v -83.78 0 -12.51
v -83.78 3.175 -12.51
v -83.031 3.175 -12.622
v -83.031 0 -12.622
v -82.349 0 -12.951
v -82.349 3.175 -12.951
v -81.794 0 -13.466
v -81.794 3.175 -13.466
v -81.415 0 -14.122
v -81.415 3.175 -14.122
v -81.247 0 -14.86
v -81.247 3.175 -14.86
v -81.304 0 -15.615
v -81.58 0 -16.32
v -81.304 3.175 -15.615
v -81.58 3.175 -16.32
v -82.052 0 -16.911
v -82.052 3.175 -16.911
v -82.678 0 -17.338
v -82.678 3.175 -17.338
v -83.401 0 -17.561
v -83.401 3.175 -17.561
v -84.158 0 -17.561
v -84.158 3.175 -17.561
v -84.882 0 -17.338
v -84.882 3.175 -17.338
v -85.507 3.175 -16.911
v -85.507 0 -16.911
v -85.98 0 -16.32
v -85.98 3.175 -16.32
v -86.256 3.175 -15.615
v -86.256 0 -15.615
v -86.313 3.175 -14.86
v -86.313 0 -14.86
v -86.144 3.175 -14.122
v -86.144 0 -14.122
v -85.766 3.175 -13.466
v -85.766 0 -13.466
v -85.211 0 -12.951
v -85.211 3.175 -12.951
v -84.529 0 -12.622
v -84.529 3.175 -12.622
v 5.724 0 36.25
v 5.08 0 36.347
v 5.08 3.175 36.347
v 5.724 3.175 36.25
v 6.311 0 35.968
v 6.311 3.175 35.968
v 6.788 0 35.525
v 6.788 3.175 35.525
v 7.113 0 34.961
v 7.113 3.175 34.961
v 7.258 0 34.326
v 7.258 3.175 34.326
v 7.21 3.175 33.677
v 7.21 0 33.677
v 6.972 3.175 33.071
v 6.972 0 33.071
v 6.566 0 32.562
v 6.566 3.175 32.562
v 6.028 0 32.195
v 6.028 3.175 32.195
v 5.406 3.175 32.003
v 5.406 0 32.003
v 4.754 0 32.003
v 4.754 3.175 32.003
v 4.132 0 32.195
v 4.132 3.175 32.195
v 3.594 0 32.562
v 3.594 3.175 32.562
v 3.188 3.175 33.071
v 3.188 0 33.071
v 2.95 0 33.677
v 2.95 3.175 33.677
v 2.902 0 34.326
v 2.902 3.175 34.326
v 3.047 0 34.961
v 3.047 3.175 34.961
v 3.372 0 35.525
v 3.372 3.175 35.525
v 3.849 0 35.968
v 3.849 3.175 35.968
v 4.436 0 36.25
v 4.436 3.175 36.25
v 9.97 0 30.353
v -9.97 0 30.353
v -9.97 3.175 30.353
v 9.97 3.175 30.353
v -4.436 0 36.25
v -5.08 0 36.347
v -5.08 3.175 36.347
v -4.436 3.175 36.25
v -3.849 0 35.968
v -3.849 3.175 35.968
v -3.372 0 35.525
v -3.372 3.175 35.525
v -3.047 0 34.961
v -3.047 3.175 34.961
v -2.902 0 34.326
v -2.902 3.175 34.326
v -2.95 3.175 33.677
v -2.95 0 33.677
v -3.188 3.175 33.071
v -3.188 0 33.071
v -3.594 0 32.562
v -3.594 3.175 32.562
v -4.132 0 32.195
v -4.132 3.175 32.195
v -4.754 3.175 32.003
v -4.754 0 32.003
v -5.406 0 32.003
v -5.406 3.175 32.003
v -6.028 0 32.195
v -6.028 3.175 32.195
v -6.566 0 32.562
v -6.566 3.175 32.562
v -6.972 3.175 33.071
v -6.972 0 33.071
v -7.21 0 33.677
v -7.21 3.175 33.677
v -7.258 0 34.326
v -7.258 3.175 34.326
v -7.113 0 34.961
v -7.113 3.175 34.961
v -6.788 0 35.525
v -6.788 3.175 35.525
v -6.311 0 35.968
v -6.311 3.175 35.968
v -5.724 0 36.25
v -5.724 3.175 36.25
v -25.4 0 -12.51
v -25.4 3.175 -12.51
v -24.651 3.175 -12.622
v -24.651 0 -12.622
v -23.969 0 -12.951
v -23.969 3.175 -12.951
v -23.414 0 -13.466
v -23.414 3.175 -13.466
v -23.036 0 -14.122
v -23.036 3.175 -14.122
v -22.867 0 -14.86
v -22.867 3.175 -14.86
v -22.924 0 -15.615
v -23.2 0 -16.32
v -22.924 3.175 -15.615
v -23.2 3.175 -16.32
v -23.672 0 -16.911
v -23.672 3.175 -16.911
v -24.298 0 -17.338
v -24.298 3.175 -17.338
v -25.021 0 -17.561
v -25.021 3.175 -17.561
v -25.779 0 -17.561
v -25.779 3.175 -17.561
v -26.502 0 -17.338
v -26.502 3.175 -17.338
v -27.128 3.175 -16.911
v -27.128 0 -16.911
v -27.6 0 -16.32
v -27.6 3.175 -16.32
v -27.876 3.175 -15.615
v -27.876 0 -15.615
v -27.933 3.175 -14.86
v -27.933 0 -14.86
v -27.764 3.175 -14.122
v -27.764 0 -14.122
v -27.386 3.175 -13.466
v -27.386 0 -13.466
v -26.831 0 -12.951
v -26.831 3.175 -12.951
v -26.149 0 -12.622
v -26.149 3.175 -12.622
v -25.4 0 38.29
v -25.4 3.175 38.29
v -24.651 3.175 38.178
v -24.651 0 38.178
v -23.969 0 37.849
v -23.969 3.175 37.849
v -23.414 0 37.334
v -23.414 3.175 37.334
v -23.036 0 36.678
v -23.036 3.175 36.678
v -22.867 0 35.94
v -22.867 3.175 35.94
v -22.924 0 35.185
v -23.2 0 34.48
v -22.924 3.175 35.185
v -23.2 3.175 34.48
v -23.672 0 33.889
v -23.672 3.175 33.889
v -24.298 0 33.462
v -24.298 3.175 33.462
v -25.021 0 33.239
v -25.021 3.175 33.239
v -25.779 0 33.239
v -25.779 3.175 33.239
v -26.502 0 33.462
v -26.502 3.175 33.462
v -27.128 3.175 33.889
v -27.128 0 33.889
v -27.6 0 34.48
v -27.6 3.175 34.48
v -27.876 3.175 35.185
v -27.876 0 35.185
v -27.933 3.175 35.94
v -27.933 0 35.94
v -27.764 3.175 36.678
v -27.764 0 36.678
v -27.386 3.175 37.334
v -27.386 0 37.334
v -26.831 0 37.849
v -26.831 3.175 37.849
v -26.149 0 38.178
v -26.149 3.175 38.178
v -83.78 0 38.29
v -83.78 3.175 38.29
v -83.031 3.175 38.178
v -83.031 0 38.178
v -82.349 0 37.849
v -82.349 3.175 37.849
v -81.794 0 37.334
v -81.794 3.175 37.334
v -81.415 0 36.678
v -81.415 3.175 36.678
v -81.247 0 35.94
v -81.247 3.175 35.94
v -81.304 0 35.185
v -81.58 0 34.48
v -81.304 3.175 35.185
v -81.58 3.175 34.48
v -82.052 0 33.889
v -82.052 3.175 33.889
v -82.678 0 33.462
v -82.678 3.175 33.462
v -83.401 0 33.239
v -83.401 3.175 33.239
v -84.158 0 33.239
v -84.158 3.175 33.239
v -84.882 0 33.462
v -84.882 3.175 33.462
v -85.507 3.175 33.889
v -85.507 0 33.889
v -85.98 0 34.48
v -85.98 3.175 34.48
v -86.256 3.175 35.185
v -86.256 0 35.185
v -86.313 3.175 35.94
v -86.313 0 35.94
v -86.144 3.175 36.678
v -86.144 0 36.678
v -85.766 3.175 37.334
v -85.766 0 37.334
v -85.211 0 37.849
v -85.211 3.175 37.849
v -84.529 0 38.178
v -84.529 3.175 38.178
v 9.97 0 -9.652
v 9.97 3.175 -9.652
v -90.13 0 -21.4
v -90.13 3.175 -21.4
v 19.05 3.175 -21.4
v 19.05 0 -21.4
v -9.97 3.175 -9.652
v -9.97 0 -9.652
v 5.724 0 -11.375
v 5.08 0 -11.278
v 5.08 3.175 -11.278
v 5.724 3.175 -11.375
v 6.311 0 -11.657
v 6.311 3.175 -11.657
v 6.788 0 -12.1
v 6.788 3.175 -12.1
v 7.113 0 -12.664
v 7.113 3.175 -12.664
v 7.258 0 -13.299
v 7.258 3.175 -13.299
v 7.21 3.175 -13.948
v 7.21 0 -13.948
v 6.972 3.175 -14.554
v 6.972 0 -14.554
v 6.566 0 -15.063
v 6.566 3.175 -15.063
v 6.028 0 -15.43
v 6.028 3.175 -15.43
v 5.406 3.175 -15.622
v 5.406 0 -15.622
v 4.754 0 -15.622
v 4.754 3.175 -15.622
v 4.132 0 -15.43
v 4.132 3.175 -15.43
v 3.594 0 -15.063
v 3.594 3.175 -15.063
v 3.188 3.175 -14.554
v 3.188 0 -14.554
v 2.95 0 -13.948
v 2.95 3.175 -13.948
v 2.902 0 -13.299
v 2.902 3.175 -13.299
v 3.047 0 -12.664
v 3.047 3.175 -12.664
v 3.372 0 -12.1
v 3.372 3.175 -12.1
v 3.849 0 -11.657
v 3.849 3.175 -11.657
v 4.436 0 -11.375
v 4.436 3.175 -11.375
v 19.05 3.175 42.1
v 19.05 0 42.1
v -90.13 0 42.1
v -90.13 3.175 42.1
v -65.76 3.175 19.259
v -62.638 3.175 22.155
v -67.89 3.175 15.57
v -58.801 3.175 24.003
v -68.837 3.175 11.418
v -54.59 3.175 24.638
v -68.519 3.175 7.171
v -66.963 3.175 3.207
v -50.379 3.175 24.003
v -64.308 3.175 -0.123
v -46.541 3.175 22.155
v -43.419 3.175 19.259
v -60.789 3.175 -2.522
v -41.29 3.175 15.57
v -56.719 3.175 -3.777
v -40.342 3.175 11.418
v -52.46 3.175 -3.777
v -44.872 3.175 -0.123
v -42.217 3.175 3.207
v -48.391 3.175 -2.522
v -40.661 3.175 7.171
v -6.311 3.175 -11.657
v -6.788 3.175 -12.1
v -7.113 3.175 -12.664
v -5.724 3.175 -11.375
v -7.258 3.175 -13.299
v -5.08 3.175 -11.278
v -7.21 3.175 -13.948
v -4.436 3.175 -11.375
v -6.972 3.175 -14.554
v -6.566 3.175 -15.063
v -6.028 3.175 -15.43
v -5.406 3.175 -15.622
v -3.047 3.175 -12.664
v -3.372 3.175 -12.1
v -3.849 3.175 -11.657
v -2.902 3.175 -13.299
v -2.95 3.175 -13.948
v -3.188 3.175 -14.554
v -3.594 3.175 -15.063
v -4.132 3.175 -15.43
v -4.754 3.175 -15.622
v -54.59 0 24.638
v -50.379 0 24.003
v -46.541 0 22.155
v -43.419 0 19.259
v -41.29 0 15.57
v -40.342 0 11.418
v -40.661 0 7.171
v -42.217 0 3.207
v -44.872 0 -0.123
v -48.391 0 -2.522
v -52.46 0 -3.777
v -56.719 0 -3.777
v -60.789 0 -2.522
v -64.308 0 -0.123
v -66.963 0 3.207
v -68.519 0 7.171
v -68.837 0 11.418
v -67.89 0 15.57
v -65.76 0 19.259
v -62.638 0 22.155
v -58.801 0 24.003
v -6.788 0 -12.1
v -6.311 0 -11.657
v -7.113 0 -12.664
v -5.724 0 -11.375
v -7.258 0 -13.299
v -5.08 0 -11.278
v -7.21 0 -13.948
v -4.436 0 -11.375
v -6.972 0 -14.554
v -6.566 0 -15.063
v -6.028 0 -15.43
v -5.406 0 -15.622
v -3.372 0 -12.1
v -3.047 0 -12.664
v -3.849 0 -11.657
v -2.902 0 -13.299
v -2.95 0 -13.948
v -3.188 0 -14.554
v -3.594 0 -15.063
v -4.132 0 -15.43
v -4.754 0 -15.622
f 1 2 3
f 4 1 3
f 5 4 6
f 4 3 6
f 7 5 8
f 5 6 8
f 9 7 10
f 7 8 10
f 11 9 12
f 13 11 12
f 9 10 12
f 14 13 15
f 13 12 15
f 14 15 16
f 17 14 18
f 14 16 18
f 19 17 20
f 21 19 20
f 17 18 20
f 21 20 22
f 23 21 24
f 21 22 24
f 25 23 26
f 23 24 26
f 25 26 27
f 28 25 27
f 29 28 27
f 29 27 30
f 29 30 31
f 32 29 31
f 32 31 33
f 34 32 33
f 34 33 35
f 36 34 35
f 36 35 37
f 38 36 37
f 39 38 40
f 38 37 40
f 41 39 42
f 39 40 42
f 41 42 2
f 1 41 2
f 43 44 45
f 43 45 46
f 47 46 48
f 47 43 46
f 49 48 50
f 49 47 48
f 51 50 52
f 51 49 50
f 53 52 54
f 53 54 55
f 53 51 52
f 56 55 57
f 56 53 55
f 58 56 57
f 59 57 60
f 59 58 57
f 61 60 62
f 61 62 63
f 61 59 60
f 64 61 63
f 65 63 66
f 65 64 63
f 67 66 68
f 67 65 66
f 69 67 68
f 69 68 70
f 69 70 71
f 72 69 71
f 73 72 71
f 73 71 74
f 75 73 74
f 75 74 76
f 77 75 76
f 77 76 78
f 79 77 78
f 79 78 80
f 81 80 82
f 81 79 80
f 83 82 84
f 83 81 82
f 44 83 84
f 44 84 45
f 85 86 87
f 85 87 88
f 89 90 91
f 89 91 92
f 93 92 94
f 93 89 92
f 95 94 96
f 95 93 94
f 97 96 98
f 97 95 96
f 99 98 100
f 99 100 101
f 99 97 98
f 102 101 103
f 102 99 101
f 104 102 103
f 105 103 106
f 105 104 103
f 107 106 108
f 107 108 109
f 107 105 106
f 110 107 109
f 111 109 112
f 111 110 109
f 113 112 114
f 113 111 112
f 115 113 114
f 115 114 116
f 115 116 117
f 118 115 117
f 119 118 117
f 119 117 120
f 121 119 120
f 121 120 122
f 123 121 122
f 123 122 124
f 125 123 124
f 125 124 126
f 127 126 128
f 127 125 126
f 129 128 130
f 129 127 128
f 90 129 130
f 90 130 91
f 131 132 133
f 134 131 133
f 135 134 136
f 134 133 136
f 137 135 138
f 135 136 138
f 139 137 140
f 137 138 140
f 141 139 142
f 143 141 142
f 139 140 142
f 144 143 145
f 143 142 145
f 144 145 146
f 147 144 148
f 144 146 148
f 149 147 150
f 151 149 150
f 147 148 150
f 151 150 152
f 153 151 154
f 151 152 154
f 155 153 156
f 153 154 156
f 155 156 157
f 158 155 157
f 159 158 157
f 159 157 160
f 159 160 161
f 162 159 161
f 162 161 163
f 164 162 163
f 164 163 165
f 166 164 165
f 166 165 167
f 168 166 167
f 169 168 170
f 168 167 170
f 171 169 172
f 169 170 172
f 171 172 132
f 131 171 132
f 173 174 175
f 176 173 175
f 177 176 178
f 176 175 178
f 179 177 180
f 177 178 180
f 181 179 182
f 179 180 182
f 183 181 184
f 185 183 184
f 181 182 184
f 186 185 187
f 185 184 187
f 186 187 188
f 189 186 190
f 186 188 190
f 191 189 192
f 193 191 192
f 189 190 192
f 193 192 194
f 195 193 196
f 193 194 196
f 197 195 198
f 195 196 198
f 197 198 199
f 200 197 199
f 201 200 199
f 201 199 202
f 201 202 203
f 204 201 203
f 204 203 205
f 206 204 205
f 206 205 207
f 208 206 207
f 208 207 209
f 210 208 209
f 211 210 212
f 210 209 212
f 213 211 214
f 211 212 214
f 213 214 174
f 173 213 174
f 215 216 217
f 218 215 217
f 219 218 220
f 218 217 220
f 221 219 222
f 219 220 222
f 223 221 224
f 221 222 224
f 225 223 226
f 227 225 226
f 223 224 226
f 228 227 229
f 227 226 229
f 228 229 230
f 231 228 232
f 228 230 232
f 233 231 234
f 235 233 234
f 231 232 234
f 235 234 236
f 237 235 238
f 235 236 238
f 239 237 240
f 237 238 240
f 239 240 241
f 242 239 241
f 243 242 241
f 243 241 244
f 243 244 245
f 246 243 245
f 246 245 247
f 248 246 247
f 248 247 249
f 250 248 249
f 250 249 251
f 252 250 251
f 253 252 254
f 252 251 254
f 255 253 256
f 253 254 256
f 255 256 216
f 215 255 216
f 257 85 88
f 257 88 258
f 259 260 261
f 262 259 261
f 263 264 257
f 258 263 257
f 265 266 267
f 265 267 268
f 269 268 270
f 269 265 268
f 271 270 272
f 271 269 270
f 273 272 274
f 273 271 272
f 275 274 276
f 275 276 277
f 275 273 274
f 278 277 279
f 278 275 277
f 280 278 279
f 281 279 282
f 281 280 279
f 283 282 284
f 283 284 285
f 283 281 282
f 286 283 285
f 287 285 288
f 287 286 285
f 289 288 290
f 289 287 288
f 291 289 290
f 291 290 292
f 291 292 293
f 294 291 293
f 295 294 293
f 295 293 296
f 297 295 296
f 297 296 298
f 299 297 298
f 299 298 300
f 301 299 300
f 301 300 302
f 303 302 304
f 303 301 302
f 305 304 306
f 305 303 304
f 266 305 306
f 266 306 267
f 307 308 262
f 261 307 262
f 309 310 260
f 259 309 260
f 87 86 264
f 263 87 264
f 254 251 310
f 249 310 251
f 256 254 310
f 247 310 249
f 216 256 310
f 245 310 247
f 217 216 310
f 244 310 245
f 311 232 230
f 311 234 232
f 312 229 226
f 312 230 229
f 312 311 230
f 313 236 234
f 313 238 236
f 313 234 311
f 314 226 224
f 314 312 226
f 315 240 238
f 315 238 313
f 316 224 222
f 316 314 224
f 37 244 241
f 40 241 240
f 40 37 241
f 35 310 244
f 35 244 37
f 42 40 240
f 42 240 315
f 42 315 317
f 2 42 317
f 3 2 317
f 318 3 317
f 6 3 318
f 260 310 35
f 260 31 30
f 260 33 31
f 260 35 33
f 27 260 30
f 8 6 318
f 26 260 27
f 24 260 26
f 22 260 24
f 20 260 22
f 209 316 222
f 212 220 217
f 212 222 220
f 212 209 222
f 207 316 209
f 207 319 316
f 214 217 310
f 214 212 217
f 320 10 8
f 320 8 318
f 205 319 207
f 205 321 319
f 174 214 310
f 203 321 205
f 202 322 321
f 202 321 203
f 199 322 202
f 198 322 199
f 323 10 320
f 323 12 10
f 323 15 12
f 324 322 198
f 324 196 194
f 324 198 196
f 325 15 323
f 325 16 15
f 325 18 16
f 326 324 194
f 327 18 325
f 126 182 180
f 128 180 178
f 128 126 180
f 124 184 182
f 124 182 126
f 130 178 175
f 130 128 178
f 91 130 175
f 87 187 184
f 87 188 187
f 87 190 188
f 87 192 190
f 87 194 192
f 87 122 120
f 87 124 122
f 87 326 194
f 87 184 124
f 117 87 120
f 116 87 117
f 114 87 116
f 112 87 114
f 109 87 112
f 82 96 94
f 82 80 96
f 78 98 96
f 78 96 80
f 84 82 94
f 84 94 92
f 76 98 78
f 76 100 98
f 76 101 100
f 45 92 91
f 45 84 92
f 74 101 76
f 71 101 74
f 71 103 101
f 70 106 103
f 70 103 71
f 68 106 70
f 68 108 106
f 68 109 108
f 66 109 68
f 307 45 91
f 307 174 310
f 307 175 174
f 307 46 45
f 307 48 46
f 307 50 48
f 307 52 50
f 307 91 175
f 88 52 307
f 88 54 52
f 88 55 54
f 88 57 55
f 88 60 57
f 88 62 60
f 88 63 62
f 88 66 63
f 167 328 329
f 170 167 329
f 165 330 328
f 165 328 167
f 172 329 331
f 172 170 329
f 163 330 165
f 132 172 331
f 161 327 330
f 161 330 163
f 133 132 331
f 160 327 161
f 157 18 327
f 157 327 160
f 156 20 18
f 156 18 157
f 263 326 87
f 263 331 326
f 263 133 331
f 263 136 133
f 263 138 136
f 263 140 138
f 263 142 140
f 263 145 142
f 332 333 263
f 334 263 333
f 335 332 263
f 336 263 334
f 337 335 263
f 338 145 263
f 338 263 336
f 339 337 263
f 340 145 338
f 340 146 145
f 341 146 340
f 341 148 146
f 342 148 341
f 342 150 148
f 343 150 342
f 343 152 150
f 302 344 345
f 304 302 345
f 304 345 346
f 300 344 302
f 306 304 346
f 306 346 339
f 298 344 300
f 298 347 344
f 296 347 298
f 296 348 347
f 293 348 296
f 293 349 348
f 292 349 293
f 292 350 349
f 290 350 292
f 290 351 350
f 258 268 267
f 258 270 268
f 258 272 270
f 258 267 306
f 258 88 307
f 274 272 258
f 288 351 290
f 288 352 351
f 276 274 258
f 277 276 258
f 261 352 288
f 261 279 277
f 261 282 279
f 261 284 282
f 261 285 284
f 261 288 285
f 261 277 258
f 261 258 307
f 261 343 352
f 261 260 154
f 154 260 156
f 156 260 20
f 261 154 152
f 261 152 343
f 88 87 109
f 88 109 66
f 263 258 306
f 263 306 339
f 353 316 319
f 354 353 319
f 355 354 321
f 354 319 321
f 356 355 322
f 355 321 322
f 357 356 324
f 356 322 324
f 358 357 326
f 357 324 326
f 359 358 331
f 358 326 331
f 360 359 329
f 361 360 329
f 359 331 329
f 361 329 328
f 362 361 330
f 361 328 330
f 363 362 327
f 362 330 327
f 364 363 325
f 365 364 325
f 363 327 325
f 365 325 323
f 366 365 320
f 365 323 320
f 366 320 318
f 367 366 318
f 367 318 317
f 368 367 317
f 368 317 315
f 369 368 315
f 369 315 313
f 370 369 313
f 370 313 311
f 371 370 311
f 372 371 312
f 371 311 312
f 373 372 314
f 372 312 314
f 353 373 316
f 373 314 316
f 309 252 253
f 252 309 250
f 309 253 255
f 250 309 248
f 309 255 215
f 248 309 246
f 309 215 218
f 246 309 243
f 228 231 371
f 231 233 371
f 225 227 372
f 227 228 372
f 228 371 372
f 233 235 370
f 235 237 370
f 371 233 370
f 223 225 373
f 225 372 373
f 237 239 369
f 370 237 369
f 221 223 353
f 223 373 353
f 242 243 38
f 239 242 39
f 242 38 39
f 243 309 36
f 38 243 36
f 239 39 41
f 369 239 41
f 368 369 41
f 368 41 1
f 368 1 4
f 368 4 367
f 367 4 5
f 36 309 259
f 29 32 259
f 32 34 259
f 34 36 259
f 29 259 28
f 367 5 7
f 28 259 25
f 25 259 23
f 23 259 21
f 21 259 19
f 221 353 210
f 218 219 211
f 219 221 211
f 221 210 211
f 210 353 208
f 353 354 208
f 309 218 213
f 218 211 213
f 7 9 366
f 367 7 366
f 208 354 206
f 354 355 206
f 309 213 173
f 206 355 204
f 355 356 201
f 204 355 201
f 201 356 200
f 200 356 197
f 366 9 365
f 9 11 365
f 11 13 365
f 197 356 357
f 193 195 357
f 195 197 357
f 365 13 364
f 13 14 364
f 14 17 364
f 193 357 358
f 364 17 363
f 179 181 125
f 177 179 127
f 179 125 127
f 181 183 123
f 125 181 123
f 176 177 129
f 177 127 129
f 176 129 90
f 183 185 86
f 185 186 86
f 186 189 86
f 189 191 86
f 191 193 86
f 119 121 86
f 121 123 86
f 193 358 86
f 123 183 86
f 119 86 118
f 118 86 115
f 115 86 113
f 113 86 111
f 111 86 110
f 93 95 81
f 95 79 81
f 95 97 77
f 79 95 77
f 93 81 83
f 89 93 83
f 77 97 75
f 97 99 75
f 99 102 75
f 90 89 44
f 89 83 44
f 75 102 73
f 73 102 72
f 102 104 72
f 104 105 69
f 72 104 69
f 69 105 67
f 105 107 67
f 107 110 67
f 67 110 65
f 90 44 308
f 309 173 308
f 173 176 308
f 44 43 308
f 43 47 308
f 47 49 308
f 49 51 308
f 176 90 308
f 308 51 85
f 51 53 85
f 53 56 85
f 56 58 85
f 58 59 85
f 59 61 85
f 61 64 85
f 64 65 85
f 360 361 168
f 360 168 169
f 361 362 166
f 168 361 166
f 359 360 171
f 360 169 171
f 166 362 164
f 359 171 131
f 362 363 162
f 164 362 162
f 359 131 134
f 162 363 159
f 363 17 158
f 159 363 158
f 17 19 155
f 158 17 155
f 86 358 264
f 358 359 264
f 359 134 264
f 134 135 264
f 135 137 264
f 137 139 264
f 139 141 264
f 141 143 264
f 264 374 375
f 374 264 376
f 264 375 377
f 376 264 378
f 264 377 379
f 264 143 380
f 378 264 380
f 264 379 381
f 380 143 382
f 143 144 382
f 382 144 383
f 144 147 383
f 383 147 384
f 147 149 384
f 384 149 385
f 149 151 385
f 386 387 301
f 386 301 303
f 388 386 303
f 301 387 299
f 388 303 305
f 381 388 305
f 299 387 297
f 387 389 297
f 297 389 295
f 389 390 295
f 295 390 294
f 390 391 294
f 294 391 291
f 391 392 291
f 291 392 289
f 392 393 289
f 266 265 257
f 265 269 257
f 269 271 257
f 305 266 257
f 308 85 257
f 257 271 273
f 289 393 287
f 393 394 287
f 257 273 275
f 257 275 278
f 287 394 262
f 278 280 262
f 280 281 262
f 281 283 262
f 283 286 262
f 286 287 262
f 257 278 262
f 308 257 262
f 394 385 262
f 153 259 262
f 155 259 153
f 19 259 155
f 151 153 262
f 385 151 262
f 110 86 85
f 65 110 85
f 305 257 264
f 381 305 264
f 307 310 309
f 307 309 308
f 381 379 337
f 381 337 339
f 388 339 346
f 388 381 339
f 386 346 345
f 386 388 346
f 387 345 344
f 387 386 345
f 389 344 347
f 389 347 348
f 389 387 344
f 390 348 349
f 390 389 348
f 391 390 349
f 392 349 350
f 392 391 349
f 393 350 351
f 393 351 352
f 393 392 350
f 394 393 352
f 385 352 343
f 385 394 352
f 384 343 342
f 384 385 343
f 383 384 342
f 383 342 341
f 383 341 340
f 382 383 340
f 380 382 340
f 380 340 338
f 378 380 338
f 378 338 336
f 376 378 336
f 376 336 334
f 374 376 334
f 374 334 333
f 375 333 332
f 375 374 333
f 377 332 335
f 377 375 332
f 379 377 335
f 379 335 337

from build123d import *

# Parameters (mm, degrees)
SKETCH2_W           = 38.1
SKETCH2_H           = 63.5
SKETCH2_R           = 2.1844
SKETCH2_W_2         = 19.939
SKETCH2_H_2         = 40.005
BOSS_EXTRUDE1_DEPTH = 3.175
SKETCH4_W           = 71.079825169
SKETCH4_H           = 63.5
SKETCH4_R           = 14.2875
SKETCH4_R_2         = 2.54
BOSS_EXTRUDE3_DEPTH = 3.175


with BuildPart() as part:
    # Sketch2 → Boss-Extrude1 (new body)
    with BuildSketch(Plane(origin=(0, 0, 0), x_dir=(1, 0, 0), z_dir=(0, 1, 0))):
        with Locations((0, -10.3505)):
            Rectangle(SKETCH2_W, SKETCH2_H)
        with Locations(Location((5.08, 13.462, 0), (0, 0, 270))):
            Circle(SKETCH2_R, mode=Mode.SUBTRACT)
        with Locations(Location((-5.08, 13.462, 0), (0, 0, 270))):
            Circle(SKETCH2_R, mode=Mode.SUBTRACT)
        with Locations(Location((-5.08, -34.163, 0), (0, 0, 270))):
            Circle(SKETCH2_R, mode=Mode.SUBTRACT)
        with Locations(Location((5.08, -34.163, 0), (0, 0, 270))):
            Circle(SKETCH2_R, mode=Mode.SUBTRACT)
        with Locations((0, -10.3505)):
            Rectangle(SKETCH2_W_2, SKETCH2_H_2, mode=Mode.SUBTRACT)
    extrude(amount=BOSS_EXTRUDE1_DEPTH)

    # Sketch4 → Boss-Extrude3 (add, through all)
    with BuildSketch(Plane(origin=(0, 3.175, 0), x_dir=(1, 0, 0), z_dir=(0, 1, 0))):
        with Locations((-54.589912584, -10.3505)):
            Rectangle(SKETCH4_W, SKETCH4_H)
        with Locations(Location((-54.589912585, -10.3505, 0), (0, 0, 270))):
            Circle(SKETCH4_R, mode=Mode.SUBTRACT)
        with Locations(Location((-83.779825169, 15.0495, 0), (0, 0, 270))):
            Circle(SKETCH4_R_2, mode=Mode.SUBTRACT)
        with Locations(Location((-25.4, 15.0495, 0), (0, 0, 270))):
            Circle(SKETCH4_R_2, mode=Mode.SUBTRACT)
        with Locations(Location((-25.4, -35.7505, 0), (0, 0, 270))):
            Circle(SKETCH4_R_2, mode=Mode.SUBTRACT)
        with Locations(Location((-83.779825169, -35.7505, 0), (0, 0, 270))):
            Circle(SKETCH4_R_2, mode=Mode.SUBTRACT)
    extrude(amount=-BOSS_EXTRUDE3_DEPTH)


solid = part.part
